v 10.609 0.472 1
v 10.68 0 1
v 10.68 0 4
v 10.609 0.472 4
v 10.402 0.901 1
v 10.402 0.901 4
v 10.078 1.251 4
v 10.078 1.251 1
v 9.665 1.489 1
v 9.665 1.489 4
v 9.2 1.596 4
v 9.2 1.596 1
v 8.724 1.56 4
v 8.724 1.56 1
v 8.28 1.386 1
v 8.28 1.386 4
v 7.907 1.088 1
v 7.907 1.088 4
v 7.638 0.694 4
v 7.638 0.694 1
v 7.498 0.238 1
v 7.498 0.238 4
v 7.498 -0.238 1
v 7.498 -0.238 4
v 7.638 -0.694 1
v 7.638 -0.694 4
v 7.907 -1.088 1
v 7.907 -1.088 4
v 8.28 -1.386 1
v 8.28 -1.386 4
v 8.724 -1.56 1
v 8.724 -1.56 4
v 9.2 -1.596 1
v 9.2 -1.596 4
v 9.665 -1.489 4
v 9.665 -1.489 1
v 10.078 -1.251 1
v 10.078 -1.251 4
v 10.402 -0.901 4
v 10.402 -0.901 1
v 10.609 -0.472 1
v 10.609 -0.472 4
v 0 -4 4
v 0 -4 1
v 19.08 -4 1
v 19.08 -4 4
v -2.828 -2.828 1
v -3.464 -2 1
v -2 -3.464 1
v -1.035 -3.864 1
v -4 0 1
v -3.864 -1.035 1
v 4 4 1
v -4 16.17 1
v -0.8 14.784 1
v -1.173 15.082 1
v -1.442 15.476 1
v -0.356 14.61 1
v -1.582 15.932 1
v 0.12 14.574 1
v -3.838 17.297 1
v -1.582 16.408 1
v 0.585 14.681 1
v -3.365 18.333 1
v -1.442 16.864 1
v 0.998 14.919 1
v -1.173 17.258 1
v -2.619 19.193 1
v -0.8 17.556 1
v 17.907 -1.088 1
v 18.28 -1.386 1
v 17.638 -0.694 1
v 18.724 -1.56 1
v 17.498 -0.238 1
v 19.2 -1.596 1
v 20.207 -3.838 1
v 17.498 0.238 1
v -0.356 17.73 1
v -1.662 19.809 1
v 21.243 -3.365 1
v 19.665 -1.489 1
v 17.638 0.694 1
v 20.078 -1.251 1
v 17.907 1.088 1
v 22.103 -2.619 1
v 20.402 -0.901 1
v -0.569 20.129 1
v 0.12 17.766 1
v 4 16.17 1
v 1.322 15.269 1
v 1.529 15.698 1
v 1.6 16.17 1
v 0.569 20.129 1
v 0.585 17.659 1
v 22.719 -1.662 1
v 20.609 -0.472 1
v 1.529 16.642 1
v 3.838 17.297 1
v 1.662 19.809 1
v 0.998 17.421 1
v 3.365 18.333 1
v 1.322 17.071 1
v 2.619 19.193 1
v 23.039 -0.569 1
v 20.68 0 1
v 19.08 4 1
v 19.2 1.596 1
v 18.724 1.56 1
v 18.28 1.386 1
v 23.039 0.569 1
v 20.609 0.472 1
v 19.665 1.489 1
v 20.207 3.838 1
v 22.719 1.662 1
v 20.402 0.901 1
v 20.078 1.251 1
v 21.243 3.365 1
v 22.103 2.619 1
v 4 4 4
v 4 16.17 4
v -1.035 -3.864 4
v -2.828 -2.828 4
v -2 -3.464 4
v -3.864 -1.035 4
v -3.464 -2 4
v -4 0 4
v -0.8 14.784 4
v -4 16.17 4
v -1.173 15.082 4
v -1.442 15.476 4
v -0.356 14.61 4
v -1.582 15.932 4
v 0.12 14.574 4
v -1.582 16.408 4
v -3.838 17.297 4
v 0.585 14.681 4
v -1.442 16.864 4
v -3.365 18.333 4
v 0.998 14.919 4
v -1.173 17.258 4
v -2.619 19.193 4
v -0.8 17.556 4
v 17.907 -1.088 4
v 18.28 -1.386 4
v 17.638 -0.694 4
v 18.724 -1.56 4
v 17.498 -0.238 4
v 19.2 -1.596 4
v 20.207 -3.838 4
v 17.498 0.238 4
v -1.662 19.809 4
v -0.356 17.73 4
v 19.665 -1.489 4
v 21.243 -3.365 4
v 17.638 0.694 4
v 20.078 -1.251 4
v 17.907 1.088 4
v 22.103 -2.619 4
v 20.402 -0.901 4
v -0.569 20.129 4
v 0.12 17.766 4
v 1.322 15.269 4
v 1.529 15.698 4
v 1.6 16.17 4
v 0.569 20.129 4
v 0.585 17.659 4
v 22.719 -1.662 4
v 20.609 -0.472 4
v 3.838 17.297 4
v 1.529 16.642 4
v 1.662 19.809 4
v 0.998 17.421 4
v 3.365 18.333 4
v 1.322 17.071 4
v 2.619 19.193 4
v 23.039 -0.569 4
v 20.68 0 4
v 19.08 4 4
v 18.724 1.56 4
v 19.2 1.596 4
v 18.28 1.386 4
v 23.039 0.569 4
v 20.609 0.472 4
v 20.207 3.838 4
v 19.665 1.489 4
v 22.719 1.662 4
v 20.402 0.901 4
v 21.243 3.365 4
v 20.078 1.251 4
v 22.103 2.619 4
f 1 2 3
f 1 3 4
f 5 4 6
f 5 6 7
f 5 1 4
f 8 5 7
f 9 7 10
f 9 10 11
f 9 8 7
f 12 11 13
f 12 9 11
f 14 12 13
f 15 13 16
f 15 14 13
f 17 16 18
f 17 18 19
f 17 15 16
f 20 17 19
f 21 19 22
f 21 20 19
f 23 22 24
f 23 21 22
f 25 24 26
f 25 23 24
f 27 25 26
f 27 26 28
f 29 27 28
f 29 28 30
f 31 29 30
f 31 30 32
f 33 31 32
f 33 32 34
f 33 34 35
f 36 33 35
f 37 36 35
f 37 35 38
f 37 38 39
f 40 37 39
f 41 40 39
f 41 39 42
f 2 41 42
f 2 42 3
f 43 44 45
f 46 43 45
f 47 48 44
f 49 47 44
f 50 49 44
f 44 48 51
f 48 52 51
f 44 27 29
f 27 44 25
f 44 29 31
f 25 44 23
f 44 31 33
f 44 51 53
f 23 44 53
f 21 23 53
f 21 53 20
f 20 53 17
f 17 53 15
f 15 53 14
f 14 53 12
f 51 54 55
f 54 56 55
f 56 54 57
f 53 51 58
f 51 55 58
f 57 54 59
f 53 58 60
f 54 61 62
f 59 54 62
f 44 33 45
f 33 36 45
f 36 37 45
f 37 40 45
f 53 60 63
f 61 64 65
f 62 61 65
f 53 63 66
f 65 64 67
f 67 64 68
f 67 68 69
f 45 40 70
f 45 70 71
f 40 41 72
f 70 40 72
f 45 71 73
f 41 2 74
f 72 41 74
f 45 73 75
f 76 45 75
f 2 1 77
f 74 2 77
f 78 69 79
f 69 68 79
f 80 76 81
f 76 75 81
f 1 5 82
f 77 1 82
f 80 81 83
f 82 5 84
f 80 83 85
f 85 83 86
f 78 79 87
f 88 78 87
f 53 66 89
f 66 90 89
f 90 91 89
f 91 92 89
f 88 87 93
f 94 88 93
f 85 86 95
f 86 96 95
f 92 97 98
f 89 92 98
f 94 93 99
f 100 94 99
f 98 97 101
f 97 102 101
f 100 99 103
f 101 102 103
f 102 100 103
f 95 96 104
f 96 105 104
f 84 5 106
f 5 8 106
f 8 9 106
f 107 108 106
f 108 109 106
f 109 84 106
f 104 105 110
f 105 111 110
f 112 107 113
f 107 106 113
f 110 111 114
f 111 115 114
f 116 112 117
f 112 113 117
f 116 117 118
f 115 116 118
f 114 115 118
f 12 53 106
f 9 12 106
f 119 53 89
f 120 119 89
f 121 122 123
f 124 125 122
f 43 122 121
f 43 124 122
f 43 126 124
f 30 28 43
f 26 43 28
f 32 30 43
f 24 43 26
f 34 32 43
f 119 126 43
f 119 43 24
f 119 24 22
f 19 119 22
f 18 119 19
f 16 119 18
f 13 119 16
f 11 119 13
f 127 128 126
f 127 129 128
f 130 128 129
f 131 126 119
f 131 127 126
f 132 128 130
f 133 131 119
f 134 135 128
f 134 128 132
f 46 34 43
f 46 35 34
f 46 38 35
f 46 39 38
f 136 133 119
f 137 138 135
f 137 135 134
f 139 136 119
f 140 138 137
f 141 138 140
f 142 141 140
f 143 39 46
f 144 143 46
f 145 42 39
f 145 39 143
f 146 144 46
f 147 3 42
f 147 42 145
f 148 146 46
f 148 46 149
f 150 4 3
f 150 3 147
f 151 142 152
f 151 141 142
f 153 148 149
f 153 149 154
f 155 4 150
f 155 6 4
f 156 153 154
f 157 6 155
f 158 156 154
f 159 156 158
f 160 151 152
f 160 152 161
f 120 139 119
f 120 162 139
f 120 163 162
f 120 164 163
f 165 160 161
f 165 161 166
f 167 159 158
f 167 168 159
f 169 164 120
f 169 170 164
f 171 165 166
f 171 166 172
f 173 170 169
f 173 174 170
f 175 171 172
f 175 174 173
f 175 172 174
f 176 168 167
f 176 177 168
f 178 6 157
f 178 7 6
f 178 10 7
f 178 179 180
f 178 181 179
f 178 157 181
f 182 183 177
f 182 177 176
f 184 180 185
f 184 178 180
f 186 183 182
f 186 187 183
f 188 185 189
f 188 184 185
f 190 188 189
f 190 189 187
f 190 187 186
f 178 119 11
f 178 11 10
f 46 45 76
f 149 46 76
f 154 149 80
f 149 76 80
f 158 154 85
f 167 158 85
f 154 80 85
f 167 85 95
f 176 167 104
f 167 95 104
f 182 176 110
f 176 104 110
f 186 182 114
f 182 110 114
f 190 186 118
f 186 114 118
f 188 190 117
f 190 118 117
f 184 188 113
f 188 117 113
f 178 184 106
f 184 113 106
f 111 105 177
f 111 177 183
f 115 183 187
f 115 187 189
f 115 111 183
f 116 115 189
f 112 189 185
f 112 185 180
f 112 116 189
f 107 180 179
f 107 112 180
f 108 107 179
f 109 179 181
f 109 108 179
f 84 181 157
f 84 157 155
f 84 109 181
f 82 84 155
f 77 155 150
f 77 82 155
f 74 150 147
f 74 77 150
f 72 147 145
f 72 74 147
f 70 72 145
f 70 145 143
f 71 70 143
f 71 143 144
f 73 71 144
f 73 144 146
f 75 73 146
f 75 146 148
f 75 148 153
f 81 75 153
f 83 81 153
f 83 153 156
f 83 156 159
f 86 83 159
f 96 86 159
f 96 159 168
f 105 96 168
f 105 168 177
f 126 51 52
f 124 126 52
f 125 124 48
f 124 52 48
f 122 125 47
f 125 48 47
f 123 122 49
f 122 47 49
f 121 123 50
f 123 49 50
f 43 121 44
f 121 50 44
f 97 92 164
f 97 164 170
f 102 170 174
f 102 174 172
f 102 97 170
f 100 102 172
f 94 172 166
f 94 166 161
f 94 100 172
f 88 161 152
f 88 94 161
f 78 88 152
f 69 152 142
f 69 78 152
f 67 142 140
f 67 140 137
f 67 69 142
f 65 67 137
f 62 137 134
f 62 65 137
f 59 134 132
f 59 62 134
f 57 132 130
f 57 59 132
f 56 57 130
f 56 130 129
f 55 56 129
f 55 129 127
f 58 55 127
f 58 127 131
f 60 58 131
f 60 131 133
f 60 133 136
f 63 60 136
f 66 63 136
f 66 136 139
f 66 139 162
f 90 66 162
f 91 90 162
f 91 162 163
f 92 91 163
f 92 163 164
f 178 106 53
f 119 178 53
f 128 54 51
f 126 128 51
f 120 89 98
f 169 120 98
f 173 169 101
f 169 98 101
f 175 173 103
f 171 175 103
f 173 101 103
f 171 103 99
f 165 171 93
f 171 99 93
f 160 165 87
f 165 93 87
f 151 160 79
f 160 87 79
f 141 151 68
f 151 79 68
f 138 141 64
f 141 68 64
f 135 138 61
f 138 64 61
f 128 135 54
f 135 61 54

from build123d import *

# Parameters (mm, degrees)
SKETCH_1_R              = 1.6
EXTRUDE_1_DEPTH         = 4
SHEET_METAL_1_OUTLINE_R = 1.6
SHEET_METAL_1_DEPTH     = 1


# Read off the part's stored shape, not the designer's step: 轉換-實體1
with BuildPart() as part:
    # Sketch 1 → 填料-伸長1 (new body)
    # profile 1 of 3: a face of its own
    with BuildSketch(Plane.XY):
        with BuildLine():
            ThreePointArc((-4, 0), (-2.828427125, 2.828427125), (0, 4))
            Line((0, 4), (4, 4))
            Line((4, 4), (4, 16.17))
            ThreePointArc((4, 16.17), (0, 20.17), (-4, 16.17))
            Line((-4, 16.17), (-4, 0))
        make_face()
        with Locations((0, 16.17)):
            Circle(SKETCH_1_R, mode=Mode.SUBTRACT)
    # profile 2 of 3: a face of its own
    with BuildSketch(Plane.XY):
        with BuildLine():
            Line((4, 4), (0, 4))
            ThreePointArc((0, 4), (-2.828427125, 2.828427125), (-4, 0))
            ThreePointArc((-4, 0), (-2.828427125, -2.828427125), (0, -4))
            ThreePointArc((0, -4), (2.828427125, -2.828427125), (4, 0))
            Line((4, 0), (4, 4))
        make_face()
    # profile 3 of 3: a face of its own
    with BuildSketch(Plane.XY):
        with BuildLine():
            Line((19.08, 4), (4, 4))
            Line((4, 4), (4, 0))
            ThreePointArc((4, 0), (2.828427125, -2.828427125), (0, -4))
            Line((0, -4), (19.08, -4))
            ThreePointArc((19.08, -4), (23.08, 0), (19.08, 4))
        make_face()
        with Locations((9.08, 0)):
            Circle(SKETCH_1_R, mode=Mode.SUBTRACT)
        with Locations((19.08, 0)):
            Circle(SKETCH_1_R, mode=Mode.SUBTRACT)
    extrude(amount=EXTRUDE_1_DEPTH)

    # Sheet Metal 1 outline → Sheet Metal 1 (cut)
    with BuildSketch(Plane.XY):
        with BuildLine():
            ThreePointArc((4, 16.17), (0, 20.17), (-4, 16.17))
            Line((-4, 16.17), (-4, 0))
            ThreePointArc((-4, 0), (-2.828427125, -2.828427125), (0, -4))
            Line((0, -4), (19.08, -4))
            ThreePointArc((19.08, -4), (23.08, 0), (19.08, 4))
            Line((19.08, 4), (4, 4))
            Line((4, 4), (4, 16.17))
        make_face()
        with Locations((9.08, 0)):
            Circle(SHEET_METAL_1_OUTLINE_R, mode=Mode.SUBTRACT)
        with Locations((19.08, 0)):
            Circle(SHEET_METAL_1_OUTLINE_R, mode=Mode.SUBTRACT)
        with Locations((0, 16.17)):
            Circle(SHEET_METAL_1_OUTLINE_R, mode=Mode.SUBTRACT)
    extrude(amount=SHEET_METAL_1_DEPTH, mode=Mode.SUBTRACT)


solid = part.part
